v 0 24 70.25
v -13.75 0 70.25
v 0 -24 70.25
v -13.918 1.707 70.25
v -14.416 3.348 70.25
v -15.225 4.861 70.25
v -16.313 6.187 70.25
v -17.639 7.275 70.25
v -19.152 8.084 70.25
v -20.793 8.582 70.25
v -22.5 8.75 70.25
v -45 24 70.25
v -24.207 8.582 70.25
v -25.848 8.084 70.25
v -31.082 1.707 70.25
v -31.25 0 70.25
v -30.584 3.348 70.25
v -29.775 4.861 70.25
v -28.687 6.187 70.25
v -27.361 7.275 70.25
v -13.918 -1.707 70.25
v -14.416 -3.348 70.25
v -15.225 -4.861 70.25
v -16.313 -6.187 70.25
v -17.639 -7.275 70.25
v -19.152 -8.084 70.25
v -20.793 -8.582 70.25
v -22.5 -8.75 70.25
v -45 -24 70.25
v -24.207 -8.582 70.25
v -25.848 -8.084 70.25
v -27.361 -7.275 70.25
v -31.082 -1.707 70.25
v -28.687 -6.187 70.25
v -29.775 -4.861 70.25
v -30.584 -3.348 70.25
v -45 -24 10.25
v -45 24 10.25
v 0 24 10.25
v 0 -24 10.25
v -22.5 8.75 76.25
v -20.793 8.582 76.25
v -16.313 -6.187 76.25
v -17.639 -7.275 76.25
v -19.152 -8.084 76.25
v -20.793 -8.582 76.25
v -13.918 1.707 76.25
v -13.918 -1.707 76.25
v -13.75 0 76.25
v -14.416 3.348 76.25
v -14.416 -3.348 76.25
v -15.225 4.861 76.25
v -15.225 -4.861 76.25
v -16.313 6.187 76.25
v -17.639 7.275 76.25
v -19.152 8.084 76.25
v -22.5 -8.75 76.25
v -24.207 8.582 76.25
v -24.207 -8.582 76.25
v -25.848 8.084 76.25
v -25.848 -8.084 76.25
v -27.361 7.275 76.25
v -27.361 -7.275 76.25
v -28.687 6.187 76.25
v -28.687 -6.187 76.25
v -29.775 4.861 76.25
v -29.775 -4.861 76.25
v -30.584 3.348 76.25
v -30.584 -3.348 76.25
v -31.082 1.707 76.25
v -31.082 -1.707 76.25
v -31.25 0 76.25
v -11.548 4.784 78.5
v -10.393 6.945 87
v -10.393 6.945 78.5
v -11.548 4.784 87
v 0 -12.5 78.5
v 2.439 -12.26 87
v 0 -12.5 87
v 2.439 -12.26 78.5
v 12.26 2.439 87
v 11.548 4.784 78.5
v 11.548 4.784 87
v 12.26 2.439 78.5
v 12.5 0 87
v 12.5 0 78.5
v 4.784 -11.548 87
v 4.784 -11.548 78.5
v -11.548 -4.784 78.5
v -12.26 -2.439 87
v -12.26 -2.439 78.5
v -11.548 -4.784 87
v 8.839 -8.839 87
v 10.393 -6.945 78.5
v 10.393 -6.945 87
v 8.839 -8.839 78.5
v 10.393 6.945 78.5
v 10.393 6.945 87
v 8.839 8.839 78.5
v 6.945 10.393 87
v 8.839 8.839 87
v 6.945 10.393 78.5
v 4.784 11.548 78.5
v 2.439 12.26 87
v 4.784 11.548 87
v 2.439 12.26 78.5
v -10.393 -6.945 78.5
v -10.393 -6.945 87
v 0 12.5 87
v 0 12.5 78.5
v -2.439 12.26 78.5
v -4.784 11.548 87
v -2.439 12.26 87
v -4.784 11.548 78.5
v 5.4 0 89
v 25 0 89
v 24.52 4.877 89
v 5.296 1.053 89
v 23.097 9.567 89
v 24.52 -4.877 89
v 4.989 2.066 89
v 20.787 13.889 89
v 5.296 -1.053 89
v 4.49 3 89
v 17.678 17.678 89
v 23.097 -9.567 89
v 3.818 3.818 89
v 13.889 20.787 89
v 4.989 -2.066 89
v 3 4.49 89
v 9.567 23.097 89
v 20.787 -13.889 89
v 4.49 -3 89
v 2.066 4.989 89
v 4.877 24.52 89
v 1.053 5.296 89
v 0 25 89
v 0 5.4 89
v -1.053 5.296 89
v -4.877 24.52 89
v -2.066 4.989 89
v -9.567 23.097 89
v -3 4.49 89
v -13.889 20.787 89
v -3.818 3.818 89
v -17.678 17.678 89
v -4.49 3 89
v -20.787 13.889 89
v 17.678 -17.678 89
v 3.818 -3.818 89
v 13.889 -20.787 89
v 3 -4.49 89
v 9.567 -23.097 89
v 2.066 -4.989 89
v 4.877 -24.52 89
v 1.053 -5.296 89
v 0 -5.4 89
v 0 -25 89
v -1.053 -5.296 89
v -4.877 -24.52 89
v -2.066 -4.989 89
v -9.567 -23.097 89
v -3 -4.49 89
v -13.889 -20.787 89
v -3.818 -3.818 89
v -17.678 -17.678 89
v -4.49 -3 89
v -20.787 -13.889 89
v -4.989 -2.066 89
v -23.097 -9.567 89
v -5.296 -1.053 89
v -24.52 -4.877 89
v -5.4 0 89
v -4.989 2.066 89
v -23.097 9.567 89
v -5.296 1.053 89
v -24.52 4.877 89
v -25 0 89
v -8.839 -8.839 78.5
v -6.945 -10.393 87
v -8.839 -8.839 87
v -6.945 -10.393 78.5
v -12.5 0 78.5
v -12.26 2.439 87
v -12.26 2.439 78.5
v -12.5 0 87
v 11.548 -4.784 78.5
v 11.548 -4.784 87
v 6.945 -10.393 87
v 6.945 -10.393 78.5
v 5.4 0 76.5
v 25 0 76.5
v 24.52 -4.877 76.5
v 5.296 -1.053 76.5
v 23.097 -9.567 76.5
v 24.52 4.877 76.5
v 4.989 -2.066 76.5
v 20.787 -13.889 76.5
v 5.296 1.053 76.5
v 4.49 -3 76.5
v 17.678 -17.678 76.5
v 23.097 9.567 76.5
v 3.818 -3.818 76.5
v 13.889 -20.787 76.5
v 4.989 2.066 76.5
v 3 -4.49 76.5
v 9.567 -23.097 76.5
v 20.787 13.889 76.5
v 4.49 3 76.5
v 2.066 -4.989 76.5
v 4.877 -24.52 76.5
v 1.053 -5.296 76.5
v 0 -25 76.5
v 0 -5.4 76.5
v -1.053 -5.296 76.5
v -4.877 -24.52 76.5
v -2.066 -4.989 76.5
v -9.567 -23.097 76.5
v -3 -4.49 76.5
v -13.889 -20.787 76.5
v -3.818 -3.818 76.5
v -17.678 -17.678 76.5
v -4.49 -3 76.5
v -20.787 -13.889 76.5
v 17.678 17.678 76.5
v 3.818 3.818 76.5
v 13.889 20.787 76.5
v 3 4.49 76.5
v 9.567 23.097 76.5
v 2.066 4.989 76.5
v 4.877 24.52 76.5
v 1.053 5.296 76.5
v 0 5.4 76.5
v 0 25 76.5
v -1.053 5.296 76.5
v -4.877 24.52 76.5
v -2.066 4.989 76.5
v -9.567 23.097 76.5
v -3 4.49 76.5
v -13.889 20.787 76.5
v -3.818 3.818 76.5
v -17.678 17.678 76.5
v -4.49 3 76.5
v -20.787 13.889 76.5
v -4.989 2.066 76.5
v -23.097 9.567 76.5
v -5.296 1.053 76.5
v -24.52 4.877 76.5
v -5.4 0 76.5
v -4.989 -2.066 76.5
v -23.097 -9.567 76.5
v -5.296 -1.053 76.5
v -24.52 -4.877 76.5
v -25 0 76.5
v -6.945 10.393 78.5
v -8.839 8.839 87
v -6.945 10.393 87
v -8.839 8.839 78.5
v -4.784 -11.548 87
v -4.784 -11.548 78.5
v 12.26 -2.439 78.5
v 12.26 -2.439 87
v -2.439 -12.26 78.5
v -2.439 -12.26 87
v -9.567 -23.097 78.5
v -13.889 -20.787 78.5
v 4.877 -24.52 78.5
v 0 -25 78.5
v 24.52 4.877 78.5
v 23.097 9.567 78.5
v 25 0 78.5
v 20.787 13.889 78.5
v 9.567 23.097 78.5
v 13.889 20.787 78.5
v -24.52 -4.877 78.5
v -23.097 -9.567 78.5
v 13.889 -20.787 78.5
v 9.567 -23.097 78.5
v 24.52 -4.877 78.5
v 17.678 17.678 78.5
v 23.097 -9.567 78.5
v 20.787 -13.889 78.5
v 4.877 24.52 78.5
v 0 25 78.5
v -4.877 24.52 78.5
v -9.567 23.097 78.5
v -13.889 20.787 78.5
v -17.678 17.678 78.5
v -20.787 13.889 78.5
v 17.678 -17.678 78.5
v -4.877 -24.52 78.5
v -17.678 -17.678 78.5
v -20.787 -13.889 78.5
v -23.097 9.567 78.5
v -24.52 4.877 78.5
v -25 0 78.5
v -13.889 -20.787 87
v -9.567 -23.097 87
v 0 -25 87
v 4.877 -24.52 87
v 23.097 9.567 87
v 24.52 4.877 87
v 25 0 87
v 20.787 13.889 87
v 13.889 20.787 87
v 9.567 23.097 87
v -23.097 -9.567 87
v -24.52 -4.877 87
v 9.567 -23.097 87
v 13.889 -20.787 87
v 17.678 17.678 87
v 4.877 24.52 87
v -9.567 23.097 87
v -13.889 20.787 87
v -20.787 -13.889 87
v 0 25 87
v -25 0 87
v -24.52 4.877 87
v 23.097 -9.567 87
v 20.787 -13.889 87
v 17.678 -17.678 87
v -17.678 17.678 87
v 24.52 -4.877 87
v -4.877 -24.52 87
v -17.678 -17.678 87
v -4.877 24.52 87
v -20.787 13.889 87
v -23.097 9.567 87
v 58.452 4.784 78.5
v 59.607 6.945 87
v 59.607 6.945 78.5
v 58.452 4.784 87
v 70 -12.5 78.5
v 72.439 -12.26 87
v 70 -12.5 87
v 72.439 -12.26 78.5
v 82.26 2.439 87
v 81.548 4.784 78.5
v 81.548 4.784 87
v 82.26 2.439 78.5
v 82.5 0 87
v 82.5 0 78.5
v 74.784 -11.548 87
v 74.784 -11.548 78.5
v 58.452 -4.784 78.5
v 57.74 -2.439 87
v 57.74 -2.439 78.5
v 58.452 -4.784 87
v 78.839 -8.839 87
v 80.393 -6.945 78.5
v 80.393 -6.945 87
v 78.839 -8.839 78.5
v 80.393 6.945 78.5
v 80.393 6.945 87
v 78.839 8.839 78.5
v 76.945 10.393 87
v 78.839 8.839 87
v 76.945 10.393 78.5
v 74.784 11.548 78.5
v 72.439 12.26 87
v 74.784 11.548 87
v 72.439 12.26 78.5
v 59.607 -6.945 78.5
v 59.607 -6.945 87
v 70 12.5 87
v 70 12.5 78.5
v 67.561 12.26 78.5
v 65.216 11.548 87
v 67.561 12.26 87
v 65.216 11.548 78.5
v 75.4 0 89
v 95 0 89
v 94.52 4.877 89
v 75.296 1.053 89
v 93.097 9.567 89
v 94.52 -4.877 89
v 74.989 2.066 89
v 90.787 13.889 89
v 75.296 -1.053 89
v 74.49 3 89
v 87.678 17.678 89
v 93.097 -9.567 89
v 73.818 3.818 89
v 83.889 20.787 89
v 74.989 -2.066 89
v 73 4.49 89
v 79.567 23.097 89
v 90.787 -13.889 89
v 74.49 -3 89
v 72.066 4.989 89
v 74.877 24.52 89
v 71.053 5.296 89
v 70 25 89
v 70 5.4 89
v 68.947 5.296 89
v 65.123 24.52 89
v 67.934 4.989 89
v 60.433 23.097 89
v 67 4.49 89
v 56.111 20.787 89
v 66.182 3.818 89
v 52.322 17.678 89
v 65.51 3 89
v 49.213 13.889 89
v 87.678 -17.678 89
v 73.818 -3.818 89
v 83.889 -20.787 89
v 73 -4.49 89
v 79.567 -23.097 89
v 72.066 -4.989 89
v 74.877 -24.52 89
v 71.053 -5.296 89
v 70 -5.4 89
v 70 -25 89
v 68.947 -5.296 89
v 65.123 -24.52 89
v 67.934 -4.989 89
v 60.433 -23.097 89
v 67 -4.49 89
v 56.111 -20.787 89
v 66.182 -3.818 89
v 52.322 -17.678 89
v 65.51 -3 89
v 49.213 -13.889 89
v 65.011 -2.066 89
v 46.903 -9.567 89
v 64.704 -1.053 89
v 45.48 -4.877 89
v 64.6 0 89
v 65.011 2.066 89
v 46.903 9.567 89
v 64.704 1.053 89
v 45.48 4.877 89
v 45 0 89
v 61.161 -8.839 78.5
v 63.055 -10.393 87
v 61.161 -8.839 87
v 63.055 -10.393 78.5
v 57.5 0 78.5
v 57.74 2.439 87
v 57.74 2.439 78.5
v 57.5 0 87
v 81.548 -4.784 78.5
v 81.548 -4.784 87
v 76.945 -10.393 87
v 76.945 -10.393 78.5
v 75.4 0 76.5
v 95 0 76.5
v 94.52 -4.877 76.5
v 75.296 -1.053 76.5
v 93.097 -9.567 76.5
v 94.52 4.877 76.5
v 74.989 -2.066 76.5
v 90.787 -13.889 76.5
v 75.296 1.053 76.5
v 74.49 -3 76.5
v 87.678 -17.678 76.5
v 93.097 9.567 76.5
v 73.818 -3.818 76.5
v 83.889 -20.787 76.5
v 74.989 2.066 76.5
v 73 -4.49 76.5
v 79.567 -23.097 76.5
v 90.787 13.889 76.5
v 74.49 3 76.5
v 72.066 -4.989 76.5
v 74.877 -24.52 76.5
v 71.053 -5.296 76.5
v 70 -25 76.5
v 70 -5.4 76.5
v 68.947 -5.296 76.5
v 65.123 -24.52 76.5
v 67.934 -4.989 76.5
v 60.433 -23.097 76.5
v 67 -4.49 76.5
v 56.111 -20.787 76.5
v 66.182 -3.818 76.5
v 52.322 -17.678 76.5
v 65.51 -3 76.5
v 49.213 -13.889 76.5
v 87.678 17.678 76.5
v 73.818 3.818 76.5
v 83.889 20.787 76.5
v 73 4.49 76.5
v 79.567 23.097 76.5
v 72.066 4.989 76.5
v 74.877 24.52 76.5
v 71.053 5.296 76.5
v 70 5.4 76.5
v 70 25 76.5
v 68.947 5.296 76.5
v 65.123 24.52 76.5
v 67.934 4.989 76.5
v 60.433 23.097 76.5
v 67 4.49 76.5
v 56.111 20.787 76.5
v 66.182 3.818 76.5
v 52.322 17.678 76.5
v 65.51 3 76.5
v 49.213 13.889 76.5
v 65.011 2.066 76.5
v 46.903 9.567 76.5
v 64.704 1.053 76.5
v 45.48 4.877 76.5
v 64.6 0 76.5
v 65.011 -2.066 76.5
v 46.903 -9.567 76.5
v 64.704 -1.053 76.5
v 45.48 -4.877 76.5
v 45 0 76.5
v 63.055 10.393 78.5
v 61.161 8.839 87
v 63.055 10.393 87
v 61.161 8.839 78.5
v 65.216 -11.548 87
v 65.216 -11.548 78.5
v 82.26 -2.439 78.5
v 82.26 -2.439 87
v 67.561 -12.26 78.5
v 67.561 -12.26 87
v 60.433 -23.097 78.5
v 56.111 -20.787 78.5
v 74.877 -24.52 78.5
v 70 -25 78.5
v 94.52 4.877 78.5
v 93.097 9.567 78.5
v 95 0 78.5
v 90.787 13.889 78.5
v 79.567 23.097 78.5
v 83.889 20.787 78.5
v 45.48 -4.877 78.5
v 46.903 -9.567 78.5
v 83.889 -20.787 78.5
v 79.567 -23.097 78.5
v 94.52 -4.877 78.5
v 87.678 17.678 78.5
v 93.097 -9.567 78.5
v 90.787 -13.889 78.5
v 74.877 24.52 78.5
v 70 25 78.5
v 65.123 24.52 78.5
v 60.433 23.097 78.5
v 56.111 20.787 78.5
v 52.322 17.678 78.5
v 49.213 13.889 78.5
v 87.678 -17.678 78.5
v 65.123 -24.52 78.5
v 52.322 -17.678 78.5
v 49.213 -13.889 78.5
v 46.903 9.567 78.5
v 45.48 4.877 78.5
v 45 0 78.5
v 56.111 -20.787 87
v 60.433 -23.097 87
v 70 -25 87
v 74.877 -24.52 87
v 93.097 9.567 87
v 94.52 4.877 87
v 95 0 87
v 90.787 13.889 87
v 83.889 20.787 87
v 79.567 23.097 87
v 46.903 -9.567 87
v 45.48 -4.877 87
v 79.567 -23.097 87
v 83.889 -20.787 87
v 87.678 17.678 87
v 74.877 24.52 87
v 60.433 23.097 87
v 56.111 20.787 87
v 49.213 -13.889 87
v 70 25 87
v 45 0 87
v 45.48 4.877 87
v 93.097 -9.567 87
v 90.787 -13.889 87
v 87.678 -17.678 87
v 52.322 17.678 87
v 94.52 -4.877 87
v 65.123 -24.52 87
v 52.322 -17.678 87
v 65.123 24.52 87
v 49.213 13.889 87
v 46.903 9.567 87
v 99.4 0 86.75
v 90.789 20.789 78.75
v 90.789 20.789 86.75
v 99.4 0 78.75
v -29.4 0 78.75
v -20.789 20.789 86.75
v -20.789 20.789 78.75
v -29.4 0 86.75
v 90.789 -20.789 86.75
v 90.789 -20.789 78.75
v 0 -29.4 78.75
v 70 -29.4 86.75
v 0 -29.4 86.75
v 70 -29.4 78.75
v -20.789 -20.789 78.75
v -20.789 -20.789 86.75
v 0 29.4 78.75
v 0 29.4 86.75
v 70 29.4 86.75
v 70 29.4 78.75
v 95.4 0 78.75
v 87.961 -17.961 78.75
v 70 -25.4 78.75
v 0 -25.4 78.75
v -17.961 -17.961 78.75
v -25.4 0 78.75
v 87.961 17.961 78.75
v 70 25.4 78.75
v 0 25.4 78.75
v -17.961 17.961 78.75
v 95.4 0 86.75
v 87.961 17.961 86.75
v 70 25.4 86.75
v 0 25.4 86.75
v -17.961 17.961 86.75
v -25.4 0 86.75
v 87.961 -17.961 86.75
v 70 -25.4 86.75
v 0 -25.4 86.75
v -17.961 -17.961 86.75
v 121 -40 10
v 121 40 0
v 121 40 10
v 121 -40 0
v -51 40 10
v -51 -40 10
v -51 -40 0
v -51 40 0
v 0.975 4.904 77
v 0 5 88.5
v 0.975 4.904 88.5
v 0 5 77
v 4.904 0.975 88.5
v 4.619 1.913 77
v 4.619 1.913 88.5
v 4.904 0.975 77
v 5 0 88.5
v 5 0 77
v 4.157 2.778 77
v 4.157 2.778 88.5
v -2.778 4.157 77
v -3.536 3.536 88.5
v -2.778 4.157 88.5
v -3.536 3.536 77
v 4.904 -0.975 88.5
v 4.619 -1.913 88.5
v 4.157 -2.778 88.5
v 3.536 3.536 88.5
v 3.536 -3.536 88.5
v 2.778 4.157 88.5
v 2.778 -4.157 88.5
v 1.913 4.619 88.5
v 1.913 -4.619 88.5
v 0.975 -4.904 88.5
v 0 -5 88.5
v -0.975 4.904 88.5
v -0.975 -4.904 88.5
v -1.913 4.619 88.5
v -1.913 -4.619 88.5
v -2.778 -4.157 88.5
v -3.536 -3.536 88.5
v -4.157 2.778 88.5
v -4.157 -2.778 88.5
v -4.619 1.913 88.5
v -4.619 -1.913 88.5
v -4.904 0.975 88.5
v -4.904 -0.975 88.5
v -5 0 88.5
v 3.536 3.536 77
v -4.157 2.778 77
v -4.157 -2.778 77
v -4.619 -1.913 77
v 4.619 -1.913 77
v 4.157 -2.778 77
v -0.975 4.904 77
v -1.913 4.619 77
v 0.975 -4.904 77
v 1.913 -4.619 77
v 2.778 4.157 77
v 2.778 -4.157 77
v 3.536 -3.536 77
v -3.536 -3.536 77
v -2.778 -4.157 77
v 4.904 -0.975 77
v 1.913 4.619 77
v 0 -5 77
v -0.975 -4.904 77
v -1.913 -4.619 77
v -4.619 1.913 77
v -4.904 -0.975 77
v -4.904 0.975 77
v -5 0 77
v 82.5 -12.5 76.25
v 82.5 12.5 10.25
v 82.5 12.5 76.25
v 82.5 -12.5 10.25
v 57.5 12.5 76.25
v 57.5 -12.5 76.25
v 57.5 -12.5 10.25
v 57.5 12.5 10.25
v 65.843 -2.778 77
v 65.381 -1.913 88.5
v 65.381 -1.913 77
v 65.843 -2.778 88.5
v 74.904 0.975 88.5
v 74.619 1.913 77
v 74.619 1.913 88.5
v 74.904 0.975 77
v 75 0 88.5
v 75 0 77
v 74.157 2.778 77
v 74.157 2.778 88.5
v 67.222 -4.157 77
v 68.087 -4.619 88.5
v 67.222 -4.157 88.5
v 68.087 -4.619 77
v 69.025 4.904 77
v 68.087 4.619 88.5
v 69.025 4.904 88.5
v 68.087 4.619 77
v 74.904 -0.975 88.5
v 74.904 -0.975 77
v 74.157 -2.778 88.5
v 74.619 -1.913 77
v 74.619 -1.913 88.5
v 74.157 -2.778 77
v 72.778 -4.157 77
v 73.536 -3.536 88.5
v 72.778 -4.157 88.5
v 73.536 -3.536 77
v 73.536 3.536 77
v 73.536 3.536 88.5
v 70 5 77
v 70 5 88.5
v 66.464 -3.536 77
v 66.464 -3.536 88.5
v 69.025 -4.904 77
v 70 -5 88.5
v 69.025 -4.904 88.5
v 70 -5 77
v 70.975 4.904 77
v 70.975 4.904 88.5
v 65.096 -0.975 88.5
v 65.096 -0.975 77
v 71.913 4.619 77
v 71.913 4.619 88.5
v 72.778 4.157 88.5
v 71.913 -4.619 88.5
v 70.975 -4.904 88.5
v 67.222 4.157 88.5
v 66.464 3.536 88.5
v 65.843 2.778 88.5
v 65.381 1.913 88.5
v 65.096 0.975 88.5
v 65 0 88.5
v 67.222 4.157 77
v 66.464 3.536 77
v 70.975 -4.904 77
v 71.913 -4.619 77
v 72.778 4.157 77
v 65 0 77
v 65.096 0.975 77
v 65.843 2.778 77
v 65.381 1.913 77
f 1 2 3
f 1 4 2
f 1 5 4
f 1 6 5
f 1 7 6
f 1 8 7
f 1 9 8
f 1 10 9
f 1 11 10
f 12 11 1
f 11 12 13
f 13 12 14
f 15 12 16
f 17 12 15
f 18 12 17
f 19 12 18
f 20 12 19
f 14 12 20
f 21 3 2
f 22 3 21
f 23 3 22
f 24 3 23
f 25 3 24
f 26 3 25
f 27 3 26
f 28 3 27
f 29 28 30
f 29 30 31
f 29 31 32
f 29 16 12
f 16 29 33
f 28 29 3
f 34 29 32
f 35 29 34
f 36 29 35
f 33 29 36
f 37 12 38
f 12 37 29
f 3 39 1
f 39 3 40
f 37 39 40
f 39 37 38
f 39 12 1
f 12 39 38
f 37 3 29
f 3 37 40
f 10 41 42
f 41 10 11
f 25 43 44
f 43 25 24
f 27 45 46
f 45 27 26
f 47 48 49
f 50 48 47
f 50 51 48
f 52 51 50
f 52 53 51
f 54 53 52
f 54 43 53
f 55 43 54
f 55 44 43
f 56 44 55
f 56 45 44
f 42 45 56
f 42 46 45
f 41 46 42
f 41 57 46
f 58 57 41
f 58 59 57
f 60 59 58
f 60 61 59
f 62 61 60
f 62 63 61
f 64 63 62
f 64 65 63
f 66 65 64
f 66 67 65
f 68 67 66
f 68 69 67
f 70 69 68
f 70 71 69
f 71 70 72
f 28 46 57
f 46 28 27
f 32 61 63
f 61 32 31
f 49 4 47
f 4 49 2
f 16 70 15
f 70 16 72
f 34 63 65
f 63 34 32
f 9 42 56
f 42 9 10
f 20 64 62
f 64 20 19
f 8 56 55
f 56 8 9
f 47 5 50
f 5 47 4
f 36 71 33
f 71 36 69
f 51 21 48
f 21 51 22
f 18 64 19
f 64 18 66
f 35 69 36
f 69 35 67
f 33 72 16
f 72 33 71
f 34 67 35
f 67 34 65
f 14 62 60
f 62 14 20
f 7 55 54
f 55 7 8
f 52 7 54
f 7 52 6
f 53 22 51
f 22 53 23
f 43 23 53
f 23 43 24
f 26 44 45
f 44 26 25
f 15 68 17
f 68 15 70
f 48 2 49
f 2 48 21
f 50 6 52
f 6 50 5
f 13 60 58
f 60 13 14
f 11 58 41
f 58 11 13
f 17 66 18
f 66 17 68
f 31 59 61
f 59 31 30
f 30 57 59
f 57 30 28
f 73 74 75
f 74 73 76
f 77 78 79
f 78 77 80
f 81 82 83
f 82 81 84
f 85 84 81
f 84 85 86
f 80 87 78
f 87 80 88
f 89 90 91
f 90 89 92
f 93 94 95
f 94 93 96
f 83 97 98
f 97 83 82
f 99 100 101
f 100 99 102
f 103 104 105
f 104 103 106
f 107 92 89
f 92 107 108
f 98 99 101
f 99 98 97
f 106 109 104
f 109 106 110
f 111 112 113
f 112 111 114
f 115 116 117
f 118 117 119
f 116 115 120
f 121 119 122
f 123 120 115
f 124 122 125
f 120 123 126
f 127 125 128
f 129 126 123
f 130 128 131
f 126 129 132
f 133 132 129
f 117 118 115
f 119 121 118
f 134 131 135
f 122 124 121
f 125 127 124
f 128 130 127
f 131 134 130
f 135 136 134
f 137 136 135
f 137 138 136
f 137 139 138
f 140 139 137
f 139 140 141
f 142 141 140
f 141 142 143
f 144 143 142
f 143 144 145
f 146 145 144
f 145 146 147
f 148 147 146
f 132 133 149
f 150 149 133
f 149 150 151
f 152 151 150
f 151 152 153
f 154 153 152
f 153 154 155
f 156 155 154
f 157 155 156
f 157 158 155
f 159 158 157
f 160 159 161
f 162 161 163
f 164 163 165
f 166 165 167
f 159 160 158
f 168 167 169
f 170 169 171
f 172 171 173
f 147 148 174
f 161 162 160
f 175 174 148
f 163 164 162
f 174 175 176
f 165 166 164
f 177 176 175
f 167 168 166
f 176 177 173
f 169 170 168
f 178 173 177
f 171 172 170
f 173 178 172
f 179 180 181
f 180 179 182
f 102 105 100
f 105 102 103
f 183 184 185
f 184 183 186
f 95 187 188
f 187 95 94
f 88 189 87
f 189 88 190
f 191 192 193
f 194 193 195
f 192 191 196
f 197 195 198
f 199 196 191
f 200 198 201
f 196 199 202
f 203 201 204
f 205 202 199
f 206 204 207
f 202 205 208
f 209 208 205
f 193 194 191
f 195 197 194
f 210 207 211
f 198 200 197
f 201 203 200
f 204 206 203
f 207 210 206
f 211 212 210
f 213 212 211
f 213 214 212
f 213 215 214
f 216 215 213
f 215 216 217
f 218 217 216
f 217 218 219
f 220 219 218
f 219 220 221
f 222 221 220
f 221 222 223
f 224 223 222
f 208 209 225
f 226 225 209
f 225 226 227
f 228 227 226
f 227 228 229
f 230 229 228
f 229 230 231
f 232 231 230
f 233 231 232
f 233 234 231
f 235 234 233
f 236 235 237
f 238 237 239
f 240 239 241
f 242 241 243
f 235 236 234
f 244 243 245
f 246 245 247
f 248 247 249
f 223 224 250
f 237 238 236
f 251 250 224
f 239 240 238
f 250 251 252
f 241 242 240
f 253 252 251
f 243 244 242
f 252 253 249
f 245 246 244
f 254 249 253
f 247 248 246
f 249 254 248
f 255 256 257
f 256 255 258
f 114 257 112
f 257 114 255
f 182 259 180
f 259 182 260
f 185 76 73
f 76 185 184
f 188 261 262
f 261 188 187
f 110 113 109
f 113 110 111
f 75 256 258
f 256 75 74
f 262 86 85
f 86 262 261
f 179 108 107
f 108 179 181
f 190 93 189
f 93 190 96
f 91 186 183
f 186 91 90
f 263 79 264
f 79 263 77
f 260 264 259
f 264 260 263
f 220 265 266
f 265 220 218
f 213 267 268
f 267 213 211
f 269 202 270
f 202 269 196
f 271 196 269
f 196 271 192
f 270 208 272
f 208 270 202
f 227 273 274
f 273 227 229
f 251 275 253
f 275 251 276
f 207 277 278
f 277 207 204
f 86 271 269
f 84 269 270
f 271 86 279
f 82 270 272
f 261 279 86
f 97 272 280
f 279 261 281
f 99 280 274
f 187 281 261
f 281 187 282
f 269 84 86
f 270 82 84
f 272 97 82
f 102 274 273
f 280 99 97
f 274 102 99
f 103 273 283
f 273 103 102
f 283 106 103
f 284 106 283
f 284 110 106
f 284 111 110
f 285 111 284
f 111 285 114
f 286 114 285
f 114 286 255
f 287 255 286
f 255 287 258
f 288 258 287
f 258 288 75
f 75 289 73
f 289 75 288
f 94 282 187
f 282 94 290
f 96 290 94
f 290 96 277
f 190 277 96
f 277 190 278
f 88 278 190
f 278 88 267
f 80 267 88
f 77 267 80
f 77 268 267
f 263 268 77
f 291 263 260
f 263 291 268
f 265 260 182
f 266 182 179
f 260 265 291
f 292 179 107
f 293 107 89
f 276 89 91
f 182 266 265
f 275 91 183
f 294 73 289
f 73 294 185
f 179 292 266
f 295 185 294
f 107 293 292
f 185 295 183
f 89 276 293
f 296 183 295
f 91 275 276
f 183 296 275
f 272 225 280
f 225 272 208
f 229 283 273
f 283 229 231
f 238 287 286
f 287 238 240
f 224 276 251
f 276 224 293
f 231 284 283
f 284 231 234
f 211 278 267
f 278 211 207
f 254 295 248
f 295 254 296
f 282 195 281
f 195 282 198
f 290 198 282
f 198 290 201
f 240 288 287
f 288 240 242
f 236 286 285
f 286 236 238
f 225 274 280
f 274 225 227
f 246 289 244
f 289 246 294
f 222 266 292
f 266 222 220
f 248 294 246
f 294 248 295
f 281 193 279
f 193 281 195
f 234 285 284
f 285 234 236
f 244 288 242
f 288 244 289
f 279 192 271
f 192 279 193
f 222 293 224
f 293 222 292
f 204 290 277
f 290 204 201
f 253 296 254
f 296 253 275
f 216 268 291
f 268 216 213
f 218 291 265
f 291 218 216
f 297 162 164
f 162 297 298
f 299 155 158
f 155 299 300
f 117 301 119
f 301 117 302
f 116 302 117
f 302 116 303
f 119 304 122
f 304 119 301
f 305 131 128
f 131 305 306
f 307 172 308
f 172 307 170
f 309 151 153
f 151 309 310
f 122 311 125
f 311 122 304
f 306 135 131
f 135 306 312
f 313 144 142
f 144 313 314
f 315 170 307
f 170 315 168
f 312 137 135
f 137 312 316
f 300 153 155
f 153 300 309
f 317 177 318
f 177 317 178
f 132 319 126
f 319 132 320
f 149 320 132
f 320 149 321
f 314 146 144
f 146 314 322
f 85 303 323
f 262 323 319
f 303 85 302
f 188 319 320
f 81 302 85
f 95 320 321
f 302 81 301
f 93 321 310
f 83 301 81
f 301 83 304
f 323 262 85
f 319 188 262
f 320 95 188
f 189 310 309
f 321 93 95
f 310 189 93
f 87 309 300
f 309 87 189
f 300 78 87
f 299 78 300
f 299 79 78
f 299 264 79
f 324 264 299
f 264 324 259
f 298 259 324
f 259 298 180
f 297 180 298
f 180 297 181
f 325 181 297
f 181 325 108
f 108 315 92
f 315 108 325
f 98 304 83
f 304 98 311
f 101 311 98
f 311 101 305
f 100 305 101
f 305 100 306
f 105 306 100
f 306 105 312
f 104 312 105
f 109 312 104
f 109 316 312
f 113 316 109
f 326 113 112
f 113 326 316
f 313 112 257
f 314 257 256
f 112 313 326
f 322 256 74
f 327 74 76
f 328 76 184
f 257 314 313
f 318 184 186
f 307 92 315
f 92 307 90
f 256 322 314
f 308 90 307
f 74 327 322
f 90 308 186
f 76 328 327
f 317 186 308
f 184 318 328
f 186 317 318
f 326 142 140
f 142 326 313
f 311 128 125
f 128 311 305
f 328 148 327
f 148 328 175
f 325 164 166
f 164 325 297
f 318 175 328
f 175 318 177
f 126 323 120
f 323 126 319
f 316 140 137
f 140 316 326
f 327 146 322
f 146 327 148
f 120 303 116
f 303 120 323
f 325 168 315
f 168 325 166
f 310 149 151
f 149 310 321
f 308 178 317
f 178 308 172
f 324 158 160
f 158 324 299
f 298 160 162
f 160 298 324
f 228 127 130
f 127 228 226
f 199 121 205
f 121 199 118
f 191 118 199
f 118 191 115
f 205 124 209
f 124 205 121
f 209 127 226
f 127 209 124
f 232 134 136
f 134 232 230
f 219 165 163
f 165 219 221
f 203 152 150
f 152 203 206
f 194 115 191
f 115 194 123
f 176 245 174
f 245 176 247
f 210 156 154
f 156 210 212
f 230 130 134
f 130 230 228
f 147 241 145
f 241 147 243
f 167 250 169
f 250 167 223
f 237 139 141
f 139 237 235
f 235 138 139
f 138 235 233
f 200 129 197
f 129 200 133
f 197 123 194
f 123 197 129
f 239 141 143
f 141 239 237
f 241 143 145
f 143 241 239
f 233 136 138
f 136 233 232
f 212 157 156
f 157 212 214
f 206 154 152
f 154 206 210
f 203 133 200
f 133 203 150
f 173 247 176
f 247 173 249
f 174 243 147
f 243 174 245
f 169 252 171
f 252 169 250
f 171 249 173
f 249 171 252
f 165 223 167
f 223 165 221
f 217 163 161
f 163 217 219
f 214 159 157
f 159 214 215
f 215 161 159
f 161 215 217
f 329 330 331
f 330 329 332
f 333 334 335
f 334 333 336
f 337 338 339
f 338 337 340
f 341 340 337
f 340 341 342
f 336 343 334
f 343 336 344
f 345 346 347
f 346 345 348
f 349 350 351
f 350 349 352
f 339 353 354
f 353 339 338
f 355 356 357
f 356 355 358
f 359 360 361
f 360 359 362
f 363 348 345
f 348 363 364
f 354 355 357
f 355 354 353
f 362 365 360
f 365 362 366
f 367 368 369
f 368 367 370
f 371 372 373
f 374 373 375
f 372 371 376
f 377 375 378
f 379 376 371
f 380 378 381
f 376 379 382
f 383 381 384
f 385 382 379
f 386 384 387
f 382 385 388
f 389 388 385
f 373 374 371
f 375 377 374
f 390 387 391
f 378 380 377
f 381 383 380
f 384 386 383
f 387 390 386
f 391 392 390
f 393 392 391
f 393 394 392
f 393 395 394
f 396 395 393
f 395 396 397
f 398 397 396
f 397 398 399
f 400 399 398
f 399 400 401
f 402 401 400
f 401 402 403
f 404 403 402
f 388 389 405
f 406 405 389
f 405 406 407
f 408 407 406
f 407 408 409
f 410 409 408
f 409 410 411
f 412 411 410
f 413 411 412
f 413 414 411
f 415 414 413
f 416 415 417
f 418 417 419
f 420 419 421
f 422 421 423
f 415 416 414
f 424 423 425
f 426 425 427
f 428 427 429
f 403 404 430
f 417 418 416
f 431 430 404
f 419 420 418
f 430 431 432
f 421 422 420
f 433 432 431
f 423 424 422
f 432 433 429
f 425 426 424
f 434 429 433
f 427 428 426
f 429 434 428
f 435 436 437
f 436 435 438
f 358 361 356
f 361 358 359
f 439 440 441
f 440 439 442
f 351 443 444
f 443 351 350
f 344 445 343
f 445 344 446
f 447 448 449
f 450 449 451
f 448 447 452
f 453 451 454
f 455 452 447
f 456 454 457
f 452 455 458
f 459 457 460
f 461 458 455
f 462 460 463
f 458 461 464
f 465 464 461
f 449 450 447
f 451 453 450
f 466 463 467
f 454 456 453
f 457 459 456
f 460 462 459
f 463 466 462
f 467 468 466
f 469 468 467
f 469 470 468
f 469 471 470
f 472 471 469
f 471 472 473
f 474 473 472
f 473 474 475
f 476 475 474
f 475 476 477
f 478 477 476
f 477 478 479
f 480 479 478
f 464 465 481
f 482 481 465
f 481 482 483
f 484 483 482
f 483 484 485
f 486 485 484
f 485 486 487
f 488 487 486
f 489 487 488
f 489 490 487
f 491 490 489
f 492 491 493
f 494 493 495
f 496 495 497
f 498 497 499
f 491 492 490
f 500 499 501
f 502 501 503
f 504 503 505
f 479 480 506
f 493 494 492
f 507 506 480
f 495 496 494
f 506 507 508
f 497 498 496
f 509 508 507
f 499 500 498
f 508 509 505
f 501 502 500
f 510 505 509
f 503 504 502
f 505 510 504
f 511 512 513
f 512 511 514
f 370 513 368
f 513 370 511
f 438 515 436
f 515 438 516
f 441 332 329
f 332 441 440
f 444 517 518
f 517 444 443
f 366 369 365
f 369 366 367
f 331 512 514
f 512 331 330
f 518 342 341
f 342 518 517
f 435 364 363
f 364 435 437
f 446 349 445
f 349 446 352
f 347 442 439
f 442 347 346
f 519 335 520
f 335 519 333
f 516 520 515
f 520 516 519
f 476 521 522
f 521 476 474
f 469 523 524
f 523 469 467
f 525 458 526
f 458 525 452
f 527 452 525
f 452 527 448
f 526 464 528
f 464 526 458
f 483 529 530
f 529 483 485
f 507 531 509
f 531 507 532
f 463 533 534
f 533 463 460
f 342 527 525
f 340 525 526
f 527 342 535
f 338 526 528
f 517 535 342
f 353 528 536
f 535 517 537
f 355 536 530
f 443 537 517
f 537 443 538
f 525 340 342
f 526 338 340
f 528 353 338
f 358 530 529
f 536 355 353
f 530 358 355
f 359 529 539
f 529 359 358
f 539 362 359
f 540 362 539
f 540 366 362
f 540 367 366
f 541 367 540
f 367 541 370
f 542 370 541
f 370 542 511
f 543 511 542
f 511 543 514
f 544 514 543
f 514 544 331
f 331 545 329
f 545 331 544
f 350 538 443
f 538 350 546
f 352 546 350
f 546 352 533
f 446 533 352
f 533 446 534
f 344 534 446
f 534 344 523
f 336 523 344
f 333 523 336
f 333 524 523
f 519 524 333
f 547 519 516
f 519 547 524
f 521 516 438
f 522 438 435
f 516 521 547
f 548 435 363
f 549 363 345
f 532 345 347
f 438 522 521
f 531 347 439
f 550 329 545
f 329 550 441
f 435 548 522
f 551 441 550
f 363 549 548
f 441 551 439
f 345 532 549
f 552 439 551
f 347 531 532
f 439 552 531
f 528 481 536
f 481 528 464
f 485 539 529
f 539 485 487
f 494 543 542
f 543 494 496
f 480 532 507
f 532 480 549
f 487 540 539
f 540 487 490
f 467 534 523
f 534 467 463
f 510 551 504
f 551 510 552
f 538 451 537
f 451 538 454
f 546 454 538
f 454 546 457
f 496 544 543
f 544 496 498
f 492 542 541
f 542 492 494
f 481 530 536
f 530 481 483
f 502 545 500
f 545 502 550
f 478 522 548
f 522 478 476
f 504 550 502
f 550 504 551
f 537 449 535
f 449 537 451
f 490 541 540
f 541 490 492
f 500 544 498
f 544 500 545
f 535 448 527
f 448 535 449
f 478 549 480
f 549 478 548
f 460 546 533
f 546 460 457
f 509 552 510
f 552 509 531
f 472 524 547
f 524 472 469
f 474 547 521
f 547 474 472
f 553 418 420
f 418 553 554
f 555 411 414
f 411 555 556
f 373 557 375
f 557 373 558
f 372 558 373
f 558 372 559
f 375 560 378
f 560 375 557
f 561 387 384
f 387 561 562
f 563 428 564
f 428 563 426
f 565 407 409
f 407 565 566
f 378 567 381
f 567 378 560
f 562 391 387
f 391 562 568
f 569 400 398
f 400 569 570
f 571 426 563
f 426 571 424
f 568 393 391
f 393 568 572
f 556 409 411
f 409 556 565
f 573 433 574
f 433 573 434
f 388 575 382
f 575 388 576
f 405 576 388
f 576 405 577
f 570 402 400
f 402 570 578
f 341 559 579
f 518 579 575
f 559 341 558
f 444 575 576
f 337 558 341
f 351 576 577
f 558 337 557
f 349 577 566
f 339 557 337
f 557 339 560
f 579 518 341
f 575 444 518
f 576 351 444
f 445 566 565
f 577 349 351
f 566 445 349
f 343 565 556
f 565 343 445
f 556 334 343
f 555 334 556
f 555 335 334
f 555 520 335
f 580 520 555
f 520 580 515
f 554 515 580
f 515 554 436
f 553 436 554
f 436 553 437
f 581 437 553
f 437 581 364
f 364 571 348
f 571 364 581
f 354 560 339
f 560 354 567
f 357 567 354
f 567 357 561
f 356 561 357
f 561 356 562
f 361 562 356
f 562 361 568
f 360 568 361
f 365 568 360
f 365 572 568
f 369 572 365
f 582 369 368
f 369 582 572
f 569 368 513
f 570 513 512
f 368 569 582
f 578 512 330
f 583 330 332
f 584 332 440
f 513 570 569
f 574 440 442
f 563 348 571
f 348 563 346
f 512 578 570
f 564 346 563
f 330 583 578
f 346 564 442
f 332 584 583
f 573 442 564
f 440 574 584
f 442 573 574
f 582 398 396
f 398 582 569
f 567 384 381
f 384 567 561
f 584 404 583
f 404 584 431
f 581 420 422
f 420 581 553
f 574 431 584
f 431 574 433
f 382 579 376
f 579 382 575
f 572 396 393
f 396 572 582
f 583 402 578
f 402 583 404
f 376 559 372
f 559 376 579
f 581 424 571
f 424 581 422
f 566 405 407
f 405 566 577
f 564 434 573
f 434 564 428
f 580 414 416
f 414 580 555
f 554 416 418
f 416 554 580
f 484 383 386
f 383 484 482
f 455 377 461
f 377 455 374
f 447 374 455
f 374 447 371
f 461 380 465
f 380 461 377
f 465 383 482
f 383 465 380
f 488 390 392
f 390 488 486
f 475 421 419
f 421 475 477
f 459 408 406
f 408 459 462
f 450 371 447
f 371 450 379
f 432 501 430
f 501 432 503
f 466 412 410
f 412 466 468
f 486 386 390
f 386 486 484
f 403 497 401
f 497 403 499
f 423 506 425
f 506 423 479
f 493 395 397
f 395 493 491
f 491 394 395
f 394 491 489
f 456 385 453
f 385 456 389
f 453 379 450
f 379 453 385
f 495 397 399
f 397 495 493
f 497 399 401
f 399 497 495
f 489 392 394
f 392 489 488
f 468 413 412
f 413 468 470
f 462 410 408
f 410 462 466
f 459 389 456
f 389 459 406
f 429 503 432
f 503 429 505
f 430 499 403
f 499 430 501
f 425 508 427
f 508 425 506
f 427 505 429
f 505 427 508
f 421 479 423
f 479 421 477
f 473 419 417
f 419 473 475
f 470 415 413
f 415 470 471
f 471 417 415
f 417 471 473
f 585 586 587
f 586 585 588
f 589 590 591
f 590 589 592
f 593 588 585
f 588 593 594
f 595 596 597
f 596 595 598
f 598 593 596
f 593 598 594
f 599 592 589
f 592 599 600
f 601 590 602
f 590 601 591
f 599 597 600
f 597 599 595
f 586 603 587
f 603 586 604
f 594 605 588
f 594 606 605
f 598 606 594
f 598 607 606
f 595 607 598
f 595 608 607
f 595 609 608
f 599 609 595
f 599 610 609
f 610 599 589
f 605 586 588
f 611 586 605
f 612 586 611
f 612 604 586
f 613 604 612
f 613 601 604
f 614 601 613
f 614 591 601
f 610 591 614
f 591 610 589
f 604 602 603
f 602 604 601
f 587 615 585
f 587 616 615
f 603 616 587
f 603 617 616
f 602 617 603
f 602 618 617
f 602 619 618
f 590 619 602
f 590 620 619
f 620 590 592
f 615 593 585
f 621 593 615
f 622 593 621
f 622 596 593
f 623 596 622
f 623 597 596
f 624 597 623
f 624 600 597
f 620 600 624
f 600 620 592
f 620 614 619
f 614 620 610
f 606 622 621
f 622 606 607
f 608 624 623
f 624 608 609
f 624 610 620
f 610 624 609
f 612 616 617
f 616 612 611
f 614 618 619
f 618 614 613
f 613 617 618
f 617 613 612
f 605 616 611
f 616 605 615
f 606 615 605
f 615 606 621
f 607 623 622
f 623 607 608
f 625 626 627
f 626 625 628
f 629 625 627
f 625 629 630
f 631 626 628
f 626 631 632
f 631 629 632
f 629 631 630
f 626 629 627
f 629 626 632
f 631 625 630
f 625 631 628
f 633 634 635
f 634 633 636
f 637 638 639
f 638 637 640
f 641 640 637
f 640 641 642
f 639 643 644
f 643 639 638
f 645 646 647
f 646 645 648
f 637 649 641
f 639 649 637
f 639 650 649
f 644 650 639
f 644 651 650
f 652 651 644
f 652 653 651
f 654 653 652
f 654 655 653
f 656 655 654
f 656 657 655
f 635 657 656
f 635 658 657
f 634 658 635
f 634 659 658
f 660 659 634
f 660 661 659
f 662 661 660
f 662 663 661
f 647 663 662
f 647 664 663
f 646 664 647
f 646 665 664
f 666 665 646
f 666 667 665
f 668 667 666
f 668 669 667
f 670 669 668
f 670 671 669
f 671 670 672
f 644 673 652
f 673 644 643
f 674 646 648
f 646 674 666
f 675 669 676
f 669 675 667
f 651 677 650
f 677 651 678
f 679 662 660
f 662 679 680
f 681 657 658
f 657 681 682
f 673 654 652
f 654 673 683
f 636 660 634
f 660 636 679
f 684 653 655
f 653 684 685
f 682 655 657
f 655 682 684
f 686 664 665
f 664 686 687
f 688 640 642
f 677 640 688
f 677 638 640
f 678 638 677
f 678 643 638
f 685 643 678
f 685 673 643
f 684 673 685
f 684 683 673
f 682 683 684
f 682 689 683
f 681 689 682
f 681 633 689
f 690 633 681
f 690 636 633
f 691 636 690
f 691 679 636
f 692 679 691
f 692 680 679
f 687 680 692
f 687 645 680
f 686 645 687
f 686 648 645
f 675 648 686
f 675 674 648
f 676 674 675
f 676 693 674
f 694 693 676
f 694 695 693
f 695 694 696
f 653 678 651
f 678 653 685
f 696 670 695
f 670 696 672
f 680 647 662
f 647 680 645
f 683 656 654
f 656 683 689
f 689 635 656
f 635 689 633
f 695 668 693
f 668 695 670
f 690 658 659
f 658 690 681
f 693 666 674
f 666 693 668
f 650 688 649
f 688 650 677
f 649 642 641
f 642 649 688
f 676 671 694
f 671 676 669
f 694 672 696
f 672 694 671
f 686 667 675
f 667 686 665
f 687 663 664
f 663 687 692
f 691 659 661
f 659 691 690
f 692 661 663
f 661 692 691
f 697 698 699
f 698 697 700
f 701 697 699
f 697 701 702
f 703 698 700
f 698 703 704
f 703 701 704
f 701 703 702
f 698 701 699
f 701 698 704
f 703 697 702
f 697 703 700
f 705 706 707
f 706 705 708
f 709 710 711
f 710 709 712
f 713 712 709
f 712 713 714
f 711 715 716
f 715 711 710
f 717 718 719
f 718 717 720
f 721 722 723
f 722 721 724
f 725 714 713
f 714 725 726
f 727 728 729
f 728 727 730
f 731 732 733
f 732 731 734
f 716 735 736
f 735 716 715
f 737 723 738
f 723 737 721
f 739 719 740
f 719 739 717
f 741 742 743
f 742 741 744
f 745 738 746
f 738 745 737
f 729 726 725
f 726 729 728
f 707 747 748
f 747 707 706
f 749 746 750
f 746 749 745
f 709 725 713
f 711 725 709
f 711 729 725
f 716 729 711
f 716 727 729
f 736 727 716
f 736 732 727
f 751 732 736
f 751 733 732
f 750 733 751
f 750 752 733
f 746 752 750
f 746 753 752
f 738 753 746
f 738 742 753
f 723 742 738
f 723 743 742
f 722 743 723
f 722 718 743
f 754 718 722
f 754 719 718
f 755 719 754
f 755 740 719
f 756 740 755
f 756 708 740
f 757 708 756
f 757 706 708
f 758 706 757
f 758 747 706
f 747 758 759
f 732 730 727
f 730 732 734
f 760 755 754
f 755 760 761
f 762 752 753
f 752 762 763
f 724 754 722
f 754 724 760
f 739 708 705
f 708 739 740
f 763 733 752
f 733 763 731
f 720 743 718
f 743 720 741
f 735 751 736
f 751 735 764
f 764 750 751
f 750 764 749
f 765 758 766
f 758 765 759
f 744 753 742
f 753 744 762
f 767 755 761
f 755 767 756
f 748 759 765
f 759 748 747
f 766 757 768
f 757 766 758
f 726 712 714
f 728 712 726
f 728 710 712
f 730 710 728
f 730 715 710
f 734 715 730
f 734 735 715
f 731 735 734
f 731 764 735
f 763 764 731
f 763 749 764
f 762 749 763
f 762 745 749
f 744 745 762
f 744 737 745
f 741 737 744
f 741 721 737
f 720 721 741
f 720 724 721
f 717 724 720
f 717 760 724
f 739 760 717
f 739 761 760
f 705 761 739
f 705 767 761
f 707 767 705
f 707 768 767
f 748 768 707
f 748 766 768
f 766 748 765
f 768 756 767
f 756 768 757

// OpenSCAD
$fn = 32;

// ------------------------------------------------------------------------
// Motor belt drive: span 70 mm, pulleys d50, belt 8 mm wide
// Every part is its own module, assembly() places every instance.
// ------------------------------------------------------------------------

// --- part 1 ---
module base_plate() {
  difference() {
    translate([-86, -40, 0]) cube([172, 80, 10]);
  }
}

// --- part 2 ---
module motor() {
  union() {
    translate([-30, -24, 0]) cube([60, 48, 45]);
    translate([33, 0, 22.5]) rotate([0, 90, 0]) cylinder(h = 6, d = 17.5, center = true);
  }
}

// --- part 3 ---
module drive_shaft() {
  translate([0, 0, -5.75]) cylinder(h = 11.5, d = 10);
}

// --- part 4 ---
module pulley_drive() {
  difference() {
    union() {
      cylinder(h = 12.5, d = 25);
      cylinder(h = 2, d = 50);
      translate([0, 0, 10.5]) cylinder(h = 2, d = 50);
    }
    translate([0, 0, -1]) cylinder(h = 14.5, d = 10.8);
  }
}

// --- part 5 ---
module idler_post() {
  translate([-12.5, -12.5, 0]) cube([25, 25, 66]);
}

// --- part 6 ---
module driven_shaft() {
  translate([0, 0, -5.75]) cylinder(h = 11.5, d = 10);
}

// --- part 7 ---
module pulley_driven() {
  difference() {
    union() {
      cylinder(h = 12.5, d = 25);
      cylinder(h = 2, d = 50);
      translate([0, 0, 10.5]) cylinder(h = 2, d = 50);
    }
    translate([0, 0, -1]) cylinder(h = 14.5, d = 10.8);
  }
}

// --- part 8 ---
module drive_belt() {
  difference() {
    linear_extrude(height = 8) polygon(points = concat([for (a = [90 : 45 : 270]) [29.4 * cos(a), 29.4 * sin(a)]], [for (a = [270 : 45 : 450]) [70 + 29.4 * cos(a), 29.4 * sin(a)]]));
    translate([0, 0, -1]) linear_extrude(height = 10) polygon(points = concat([for (a = [90 : 45 : 270]) [25.4 * cos(a), 25.4 * sin(a)]], [for (a = [270 : 45 : 450]) [70 + 25.4 * cos(a), 25.4 * sin(a)]]));
  }
}

// --- assembly ---
module assembly() {
  color([0.80, 0.24, 0.20]) translate([35, 0, 0]) rotate([0, 0, 0]) base_plate();
  color([0.20, 0.45, 0.75]) translate([0, 0, 40.25]) rotate([0, 270, 0]) motor();
  color([0.25, 0.62, 0.32]) translate([0, 0, 82.75]) rotate([0, 0, 0]) drive_shaft();
  color([0.92, 0.70, 0.18]) translate([0, 0, 76.5]) rotate([0, 0, 0]) pulley_drive();
  color([0.58, 0.35, 0.70]) translate([70, 0, 10.25]) rotate([0, 0, 0]) idler_post();
  color([0.16, 0.66, 0.66]) translate([70, 0, 82.75]) rotate([0, 0, 0]) driven_shaft();
  color([0.85, 0.48, 0.18]) translate([70, 0, 76.5]) rotate([0, 0, 0]) pulley_driven();
  color([0.55, 0.60, 0.65]) translate([0, 0, 78.75]) rotate([0, 0, 0]) drive_belt();
}

assembly();
